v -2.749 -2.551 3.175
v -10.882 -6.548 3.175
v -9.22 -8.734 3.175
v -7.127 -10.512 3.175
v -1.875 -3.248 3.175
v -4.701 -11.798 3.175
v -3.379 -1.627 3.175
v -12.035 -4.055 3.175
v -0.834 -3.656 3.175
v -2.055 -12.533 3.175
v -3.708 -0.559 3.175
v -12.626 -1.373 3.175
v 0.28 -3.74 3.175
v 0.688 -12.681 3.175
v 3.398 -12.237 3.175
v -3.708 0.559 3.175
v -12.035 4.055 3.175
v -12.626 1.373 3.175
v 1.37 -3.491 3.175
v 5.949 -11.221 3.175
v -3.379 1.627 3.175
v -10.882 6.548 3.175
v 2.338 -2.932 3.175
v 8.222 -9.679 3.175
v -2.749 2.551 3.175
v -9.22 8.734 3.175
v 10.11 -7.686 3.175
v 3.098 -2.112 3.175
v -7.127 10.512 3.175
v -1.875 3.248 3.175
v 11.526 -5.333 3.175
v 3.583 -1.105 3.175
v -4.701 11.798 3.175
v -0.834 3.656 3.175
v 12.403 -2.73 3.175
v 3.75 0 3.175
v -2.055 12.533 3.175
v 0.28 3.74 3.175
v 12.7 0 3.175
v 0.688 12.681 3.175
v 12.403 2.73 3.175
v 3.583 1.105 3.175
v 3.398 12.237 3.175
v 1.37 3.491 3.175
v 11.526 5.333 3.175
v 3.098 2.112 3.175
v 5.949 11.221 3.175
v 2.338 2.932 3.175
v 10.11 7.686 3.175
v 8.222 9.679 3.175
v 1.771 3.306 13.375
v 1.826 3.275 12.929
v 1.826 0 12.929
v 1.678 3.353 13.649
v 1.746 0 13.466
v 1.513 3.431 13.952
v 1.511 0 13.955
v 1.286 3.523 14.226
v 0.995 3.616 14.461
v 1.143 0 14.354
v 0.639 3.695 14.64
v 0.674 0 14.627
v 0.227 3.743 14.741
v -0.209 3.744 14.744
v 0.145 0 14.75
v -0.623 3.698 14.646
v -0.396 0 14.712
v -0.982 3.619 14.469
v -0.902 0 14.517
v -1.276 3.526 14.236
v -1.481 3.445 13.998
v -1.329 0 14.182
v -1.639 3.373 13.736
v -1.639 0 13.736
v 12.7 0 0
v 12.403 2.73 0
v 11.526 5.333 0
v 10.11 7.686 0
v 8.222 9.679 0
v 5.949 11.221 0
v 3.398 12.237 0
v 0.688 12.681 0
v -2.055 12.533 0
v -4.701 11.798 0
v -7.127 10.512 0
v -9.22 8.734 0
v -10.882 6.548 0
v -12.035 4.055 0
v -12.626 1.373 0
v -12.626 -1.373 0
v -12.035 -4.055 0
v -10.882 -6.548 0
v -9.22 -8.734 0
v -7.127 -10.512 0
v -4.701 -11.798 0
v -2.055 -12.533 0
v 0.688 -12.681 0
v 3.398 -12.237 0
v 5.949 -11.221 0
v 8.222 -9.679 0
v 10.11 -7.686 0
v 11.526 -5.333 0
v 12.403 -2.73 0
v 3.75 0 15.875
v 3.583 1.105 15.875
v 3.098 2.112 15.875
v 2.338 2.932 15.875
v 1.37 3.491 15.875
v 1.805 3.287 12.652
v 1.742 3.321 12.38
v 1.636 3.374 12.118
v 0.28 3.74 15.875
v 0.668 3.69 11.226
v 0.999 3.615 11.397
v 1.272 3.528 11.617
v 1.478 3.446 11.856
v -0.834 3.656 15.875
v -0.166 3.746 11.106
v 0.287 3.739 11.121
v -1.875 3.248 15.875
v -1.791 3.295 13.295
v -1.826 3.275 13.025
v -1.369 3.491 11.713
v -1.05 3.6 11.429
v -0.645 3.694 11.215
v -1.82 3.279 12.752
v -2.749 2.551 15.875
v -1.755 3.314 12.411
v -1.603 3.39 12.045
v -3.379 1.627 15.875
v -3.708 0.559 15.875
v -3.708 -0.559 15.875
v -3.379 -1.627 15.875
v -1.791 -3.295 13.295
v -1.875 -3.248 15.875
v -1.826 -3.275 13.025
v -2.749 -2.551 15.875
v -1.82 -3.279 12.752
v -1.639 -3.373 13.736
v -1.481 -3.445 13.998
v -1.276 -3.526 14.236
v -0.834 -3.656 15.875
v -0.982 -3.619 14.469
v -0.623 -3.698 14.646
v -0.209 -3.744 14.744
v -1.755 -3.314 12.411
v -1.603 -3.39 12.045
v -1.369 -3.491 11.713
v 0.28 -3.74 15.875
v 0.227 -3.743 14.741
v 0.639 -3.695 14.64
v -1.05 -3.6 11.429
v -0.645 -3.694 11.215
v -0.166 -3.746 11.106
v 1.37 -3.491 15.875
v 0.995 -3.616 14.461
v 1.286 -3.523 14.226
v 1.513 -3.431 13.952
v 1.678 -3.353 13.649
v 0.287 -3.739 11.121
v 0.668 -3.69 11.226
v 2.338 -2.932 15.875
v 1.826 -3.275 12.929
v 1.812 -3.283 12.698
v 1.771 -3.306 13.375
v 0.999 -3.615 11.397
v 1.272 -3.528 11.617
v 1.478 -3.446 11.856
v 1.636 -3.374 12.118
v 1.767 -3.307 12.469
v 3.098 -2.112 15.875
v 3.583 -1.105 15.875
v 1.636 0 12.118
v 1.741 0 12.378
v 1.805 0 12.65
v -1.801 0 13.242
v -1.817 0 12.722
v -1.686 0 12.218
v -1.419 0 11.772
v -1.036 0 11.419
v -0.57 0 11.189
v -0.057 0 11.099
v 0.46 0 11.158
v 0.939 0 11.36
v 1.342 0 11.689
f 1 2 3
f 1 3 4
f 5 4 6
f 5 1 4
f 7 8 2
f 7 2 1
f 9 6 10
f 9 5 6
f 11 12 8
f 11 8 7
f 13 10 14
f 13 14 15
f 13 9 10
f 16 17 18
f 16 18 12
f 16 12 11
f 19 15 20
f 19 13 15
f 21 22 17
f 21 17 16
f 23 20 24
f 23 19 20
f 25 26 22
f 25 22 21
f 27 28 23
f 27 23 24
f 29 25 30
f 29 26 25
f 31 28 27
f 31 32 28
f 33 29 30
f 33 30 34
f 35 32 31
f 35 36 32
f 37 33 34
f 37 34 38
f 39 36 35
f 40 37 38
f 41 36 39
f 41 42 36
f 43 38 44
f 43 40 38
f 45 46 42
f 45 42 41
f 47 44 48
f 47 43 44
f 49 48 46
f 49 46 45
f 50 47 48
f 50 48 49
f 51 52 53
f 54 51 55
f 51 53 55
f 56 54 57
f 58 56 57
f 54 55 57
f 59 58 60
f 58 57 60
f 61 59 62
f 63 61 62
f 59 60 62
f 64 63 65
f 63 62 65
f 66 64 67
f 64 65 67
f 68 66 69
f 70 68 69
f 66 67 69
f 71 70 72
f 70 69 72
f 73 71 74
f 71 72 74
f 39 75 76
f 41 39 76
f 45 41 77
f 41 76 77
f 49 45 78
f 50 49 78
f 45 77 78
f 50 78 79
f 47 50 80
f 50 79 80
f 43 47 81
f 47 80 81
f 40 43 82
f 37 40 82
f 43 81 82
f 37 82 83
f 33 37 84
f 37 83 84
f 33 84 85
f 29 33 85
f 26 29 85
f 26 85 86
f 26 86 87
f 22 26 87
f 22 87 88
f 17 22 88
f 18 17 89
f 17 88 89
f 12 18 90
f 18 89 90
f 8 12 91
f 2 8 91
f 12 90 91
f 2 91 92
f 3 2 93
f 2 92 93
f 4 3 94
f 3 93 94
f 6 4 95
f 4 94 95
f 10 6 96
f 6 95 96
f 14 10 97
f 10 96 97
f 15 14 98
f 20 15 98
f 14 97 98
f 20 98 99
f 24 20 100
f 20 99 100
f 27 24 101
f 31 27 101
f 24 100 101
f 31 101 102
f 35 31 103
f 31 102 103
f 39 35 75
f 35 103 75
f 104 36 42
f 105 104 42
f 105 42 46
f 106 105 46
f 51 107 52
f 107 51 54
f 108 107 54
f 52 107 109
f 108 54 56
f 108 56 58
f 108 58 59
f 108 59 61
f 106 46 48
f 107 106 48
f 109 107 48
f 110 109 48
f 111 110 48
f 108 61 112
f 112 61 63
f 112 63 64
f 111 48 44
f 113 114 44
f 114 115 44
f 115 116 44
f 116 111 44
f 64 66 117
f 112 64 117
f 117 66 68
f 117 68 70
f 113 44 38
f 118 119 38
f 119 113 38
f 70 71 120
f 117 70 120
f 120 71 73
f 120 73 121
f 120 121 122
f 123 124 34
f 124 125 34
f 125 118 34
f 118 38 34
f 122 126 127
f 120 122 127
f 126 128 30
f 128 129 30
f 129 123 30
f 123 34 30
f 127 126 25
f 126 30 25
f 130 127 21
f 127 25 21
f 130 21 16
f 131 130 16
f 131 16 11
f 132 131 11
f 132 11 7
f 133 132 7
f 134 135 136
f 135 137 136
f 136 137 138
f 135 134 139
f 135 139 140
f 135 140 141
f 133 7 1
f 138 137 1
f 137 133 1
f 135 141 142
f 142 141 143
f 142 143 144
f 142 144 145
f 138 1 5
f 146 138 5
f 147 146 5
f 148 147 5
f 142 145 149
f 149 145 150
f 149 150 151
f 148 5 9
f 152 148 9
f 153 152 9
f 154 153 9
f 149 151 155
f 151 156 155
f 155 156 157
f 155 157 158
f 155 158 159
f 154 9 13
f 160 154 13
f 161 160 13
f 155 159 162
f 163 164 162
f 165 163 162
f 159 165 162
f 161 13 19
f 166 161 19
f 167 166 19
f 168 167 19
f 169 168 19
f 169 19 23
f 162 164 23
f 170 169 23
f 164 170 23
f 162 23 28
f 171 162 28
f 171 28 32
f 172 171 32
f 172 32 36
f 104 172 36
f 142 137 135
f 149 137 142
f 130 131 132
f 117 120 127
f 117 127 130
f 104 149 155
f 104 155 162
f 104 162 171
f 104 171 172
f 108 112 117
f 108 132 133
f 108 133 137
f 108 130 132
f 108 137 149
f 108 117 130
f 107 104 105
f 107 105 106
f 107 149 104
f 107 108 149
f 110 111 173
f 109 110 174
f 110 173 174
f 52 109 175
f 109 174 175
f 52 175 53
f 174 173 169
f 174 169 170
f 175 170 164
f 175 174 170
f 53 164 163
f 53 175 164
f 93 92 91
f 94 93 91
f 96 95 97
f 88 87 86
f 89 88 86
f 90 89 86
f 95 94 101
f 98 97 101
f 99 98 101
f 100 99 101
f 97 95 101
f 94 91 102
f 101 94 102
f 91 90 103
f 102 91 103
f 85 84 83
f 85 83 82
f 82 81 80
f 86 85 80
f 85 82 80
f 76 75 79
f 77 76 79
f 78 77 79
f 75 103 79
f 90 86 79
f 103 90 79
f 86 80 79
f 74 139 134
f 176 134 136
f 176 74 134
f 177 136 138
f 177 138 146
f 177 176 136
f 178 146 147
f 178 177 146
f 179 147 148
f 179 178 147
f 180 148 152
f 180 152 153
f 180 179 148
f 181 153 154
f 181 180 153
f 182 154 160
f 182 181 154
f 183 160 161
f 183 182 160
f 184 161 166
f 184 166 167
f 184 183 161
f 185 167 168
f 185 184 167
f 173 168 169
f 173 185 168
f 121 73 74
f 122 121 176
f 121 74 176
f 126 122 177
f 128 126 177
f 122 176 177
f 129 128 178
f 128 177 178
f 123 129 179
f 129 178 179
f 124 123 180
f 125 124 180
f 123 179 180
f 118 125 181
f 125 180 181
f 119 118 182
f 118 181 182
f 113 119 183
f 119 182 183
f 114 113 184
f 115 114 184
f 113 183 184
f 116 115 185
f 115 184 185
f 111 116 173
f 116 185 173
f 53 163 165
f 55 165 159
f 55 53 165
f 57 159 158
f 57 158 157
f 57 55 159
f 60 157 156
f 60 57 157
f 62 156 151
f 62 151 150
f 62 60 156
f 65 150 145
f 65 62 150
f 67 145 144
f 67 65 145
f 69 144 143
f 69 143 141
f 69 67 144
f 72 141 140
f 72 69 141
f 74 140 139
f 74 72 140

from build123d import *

# Parameters (mm, degrees)
F0_R     = 12.7
F1_DEPTH = 3.175
F2_R     = 3.75
F3_DEPTH = 12.7
F5_DEPTH = 5.08
F6_DEPTH = 25.4


with BuildPart() as f1:
    # F0 (on Top) → F1 (new body)
    with BuildSketch(Plane.XY):
        Circle(F0_R)
    extrude(amount=F1_DEPTH)

    # F2 (on face) → F3 (join)
    with BuildSketch(Plane.XY.offset(3.175)):
        Circle(F2_R)
    extrude(amount=F3_DEPTH)

    # F4 (on Front) → F5 (cut)
    with BuildSketch(Plane.XZ):
        with BuildLine():
            ThreePointArc((1.6361789283, 12.118075807), (1.7781010103, 12.5127154354), (1.8262548359, 12.929324992))
            ThreePointArc((1.8262548359, 12.929324992), (0.4140579041, 14.7080219245), (-1.6385001539, 13.7358756546))
            ThreePointArc((-1.6385001539, 13.7358756546), (0.4142883311, 14.7027274799), (1.8239336103, 12.9246264696))
            ThreePointArc((1.8239336103, 12.9246264696), (1.7763757069, 12.5105685655), (1.6361789283, 12.118075807))
        make_face()
        with BuildLine():
            ThreePointArc((1.8239336103, 12.9246264696), (0.4142883311, 14.7027274799), (-1.6385001539, 13.7358756546))
            ThreePointArc((-1.6385001539, 13.7358756546), (-0.8089007564, 11.2919837656), (1.6361789283, 12.118075807))
            ThreePointArc((1.6361789283, 12.118075807), (1.7763757069, 12.5105685655), (1.8239336103, 12.9246264696))
        make_face()
        with BuildLine():
            ThreePointArc((1.6361789283, 12.118075807), (-0.8089007564, 11.2919837656), (-1.6385001539, 13.7358756546))
            ThreePointArc((-1.6385001539, 13.7358756546), (-0.811221982, 11.2872852432), (1.6361789283, 12.118075807))
        make_face()
    extrude(amount=F5_DEPTH, mode=Mode.SUBTRACT)

    # F4 (on Front) → F6 (cut)
    with BuildSketch(Plane.XZ):
        with BuildLine():
            ThreePointArc((1.6361789283, 12.118075807), (1.7781010103, 12.5127154354), (1.8262548359, 12.929324992))
            ThreePointArc((1.8262548359, 12.929324992), (0.4140579041, 14.7080219245), (-1.6385001539, 13.7358756546))
            ThreePointArc((-1.6385001539, 13.7358756546), (0.4142883311, 14.7027274799), (1.8239336103, 12.9246264696))
            ThreePointArc((1.8239336103, 12.9246264696), (1.7763757069, 12.5105685655), (1.6361789283, 12.118075807))
        make_face()
        with BuildLine():
            ThreePointArc((1.8239336103, 12.9246264696), (0.4142883311, 14.7027274799), (-1.6385001539, 13.7358756546))
            ThreePointArc((-1.6385001539, 13.7358756546), (-0.8089007564, 11.2919837656), (1.6361789283, 12.118075807))
            ThreePointArc((1.6361789283, 12.118075807), (1.7763757069, 12.5105685655), (1.8239336103, 12.9246264696))
        make_face()
        with BuildLine():
            ThreePointArc((1.6361789283, 12.118075807), (-0.8089007564, 11.2919837656), (-1.6385001539, 13.7358756546))
            ThreePointArc((-1.6385001539, 13.7358756546), (-0.811221982, 11.2872852432), (1.6361789283, 12.118075807))
        make_face()
    extrude(amount=-F6_DEPTH, mode=Mode.SUBTRACT)


solid = f1.part
